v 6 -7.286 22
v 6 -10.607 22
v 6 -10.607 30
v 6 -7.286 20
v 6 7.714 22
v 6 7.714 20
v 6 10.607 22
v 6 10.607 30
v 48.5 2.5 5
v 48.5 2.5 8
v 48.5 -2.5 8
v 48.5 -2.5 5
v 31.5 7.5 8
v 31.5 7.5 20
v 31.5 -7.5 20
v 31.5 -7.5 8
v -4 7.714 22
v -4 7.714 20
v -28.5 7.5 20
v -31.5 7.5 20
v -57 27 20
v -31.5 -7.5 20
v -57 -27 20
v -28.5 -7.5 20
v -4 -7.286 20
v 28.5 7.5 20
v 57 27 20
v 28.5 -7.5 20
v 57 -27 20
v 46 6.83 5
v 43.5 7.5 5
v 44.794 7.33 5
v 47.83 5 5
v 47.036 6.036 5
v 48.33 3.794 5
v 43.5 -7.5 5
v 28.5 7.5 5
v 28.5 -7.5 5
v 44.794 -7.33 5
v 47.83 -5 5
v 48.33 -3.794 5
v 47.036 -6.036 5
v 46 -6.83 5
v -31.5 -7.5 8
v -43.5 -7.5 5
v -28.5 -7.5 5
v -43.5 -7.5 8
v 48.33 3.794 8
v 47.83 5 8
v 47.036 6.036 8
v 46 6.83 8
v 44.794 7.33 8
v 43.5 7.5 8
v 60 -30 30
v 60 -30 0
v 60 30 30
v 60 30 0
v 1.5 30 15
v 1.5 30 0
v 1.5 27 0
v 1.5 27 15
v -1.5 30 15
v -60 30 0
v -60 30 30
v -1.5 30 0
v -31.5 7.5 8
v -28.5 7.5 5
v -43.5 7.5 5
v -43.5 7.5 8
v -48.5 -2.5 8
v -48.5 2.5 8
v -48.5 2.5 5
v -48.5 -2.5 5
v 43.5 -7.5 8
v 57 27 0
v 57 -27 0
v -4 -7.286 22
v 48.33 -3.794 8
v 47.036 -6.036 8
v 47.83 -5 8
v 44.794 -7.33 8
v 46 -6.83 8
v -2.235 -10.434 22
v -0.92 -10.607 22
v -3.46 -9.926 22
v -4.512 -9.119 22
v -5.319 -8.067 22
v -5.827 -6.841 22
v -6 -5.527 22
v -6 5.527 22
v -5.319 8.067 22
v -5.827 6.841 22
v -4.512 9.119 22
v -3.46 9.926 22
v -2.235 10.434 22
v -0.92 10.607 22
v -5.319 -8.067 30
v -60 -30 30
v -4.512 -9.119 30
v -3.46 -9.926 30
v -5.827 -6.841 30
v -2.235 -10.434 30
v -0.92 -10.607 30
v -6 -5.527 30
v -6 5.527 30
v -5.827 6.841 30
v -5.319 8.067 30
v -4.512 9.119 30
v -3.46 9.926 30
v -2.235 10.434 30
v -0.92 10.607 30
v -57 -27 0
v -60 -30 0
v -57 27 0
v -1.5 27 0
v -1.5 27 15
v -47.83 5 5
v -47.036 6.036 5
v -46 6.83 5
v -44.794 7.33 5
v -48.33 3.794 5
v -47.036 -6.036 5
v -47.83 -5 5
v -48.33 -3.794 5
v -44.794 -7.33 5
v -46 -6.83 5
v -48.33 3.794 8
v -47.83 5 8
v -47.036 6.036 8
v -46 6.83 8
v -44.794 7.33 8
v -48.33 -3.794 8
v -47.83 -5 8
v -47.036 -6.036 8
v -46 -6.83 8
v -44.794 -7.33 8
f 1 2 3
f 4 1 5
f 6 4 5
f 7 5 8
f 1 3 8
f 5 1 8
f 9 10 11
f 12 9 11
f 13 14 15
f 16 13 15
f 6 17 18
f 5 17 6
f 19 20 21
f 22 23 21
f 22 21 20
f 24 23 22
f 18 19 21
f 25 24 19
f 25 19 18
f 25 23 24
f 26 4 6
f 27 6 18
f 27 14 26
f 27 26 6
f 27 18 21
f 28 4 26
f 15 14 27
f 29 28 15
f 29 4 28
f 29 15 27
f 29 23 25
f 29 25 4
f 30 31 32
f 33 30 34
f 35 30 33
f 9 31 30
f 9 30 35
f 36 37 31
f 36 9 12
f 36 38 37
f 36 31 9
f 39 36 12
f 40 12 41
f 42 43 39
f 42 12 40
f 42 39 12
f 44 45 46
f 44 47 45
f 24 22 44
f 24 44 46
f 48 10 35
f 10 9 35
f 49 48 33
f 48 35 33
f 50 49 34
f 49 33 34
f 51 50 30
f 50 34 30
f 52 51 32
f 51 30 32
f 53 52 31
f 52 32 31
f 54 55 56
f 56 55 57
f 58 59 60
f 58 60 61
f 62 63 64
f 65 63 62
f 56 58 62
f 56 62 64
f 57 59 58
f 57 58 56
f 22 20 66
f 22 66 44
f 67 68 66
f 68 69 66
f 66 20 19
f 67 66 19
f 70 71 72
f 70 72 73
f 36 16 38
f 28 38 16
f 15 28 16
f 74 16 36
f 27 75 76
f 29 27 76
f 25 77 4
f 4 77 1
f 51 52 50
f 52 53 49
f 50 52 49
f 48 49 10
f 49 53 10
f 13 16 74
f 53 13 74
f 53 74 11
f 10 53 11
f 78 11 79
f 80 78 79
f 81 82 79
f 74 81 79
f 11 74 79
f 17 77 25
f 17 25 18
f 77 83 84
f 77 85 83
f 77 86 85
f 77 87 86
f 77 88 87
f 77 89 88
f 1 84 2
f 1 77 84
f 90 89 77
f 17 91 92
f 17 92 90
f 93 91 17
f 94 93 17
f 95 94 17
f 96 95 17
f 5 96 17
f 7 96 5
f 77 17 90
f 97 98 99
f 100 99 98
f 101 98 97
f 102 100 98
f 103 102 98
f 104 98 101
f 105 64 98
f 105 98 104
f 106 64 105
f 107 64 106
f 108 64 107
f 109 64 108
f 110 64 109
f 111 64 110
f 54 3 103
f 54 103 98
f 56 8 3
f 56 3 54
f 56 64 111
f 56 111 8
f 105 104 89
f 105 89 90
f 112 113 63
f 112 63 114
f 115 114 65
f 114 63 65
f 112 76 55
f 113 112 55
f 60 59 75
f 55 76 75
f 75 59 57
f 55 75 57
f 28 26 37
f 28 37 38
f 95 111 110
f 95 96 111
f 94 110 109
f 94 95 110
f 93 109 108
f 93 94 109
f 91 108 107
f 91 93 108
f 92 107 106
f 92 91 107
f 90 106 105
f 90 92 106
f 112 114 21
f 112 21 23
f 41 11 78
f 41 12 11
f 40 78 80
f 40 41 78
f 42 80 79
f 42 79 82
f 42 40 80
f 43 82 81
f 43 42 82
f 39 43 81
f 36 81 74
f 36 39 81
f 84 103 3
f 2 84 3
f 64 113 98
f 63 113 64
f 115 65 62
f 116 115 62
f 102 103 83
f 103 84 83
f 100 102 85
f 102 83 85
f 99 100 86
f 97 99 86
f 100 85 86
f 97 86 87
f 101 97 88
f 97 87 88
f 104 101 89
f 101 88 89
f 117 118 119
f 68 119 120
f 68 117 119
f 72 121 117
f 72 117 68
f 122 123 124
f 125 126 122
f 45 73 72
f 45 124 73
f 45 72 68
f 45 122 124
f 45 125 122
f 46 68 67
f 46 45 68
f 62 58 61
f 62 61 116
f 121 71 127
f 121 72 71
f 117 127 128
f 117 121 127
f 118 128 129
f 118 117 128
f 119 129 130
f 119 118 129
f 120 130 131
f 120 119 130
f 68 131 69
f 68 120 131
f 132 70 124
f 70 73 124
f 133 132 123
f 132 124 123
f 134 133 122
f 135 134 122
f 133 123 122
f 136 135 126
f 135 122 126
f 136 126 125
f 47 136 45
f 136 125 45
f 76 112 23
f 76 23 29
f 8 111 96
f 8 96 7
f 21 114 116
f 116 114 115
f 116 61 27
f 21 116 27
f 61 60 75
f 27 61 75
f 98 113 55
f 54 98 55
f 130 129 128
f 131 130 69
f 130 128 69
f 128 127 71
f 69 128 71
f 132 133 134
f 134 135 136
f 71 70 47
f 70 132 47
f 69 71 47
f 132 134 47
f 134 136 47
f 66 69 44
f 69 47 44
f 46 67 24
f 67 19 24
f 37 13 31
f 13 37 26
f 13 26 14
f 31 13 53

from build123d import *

# Parameters (mm, degrees)
F0_W      = 120
F0_H      = 60
F1_DEPTH  = 30
F2_W      = 12
F2_H      = 21.2132
F3_DEPTH  = 8
F4_W      = 114
F4_H      = 54
F5_DEPTH  = 20
F6_W      = 3
F6_H      = 15
F7_DEPTH  = 12
F8_W      = 20
F8_H      = 15
F9_DEPTH  = 3
F10_R     = 5
F11_R     = 5.08
F12_W     = 3
F12_H     = 15
F13_DEPTH = 3
F14_W     = 10
F14_H     = 15
F15_DEPTH = 2


with BuildPart() as f1:
    # F0 (on Top) → F1 (new body)
    with BuildSketch(Plane.XY):
        Rectangle(F0_W, F0_H)
    extrude(amount=F1_DEPTH)

    # F2 (on face) → F3 (cut)
    with BuildSketch(Plane.XY.offset(30)):
        Rectangle(F2_W, F2_H)
    extrude(amount=-F3_DEPTH, mode=Mode.SUBTRACT)

    # F4 (on face) → F5 (cut)
    with BuildSketch(Plane(origin=(0, 0, 0), x_dir=(1, 0, 0), z_dir=(0, 0, -1))):
        Rectangle(F4_W, F4_H)
    extrude(amount=-F5_DEPTH, mode=Mode.SUBTRACT)

    # F6 (on face) → F7 (join)
    with BuildSketch(Plane(origin=(0, 0, 20), x_dir=(1, 0, 0), z_dir=(0, 0, -1))):
        with Locations((-30, 0)):
            Rectangle(F6_W, F6_H)
        with Locations((30, 0)):
            Rectangle(F6_W, F6_H)
    extrude(amount=F7_DEPTH)

    # F8 (on face) → F9 (join)
    with BuildSketch(Plane(origin=(0, 0, 8), x_dir=(1, 0, 0), z_dir=(0, 0, -1))):
        with Locations((-38.5, 0)):
            Rectangle(F8_W, F8_H)
        with Locations((38.5, 0)):
            Rectangle(F8_W, F8_H)
    extrude(amount=F9_DEPTH)

    # F10
    f10_edges = [f1.edges().sort_by_distance(p)[0] for p in [
        (-48.5, -7.5, 6.5),
        (-48.5, 7.5, 6.5),
        (48.5, 7.5, 6.5),
        (48.5, -7.5, 6.5),
    ]]
    fillet(f10_edges, radius=F10_R)

    # F11
    f11_edges = [f1.edges().sort_by_distance(p)[0] for p in [
        (-6, 10.6066, 26),
        (-6, -10.6066, 26),
    ]]
    fillet(f11_edges, radius=F11_R)

    # F12 (on face) → F13 (cut, through all)
    with BuildSketch(Plane(origin=(0, 30, 0), x_dir=(-1, 0, 0), z_dir=(0, 1, 0))):
        with Locations((0, 7.5)):
            Rectangle(F12_W, F12_H)
    extrude(amount=-F13_DEPTH, mode=Mode.SUBTRACT)

    # F14 (on face) → F15 (cut, through all)
    with BuildSketch(Plane.XY.offset(22)):
        with Locations((1, 0.213741)):
            Rectangle(F14_W, F14_H)
    extrude(amount=-F15_DEPTH, mode=Mode.SUBTRACT)


solid = f1.part
